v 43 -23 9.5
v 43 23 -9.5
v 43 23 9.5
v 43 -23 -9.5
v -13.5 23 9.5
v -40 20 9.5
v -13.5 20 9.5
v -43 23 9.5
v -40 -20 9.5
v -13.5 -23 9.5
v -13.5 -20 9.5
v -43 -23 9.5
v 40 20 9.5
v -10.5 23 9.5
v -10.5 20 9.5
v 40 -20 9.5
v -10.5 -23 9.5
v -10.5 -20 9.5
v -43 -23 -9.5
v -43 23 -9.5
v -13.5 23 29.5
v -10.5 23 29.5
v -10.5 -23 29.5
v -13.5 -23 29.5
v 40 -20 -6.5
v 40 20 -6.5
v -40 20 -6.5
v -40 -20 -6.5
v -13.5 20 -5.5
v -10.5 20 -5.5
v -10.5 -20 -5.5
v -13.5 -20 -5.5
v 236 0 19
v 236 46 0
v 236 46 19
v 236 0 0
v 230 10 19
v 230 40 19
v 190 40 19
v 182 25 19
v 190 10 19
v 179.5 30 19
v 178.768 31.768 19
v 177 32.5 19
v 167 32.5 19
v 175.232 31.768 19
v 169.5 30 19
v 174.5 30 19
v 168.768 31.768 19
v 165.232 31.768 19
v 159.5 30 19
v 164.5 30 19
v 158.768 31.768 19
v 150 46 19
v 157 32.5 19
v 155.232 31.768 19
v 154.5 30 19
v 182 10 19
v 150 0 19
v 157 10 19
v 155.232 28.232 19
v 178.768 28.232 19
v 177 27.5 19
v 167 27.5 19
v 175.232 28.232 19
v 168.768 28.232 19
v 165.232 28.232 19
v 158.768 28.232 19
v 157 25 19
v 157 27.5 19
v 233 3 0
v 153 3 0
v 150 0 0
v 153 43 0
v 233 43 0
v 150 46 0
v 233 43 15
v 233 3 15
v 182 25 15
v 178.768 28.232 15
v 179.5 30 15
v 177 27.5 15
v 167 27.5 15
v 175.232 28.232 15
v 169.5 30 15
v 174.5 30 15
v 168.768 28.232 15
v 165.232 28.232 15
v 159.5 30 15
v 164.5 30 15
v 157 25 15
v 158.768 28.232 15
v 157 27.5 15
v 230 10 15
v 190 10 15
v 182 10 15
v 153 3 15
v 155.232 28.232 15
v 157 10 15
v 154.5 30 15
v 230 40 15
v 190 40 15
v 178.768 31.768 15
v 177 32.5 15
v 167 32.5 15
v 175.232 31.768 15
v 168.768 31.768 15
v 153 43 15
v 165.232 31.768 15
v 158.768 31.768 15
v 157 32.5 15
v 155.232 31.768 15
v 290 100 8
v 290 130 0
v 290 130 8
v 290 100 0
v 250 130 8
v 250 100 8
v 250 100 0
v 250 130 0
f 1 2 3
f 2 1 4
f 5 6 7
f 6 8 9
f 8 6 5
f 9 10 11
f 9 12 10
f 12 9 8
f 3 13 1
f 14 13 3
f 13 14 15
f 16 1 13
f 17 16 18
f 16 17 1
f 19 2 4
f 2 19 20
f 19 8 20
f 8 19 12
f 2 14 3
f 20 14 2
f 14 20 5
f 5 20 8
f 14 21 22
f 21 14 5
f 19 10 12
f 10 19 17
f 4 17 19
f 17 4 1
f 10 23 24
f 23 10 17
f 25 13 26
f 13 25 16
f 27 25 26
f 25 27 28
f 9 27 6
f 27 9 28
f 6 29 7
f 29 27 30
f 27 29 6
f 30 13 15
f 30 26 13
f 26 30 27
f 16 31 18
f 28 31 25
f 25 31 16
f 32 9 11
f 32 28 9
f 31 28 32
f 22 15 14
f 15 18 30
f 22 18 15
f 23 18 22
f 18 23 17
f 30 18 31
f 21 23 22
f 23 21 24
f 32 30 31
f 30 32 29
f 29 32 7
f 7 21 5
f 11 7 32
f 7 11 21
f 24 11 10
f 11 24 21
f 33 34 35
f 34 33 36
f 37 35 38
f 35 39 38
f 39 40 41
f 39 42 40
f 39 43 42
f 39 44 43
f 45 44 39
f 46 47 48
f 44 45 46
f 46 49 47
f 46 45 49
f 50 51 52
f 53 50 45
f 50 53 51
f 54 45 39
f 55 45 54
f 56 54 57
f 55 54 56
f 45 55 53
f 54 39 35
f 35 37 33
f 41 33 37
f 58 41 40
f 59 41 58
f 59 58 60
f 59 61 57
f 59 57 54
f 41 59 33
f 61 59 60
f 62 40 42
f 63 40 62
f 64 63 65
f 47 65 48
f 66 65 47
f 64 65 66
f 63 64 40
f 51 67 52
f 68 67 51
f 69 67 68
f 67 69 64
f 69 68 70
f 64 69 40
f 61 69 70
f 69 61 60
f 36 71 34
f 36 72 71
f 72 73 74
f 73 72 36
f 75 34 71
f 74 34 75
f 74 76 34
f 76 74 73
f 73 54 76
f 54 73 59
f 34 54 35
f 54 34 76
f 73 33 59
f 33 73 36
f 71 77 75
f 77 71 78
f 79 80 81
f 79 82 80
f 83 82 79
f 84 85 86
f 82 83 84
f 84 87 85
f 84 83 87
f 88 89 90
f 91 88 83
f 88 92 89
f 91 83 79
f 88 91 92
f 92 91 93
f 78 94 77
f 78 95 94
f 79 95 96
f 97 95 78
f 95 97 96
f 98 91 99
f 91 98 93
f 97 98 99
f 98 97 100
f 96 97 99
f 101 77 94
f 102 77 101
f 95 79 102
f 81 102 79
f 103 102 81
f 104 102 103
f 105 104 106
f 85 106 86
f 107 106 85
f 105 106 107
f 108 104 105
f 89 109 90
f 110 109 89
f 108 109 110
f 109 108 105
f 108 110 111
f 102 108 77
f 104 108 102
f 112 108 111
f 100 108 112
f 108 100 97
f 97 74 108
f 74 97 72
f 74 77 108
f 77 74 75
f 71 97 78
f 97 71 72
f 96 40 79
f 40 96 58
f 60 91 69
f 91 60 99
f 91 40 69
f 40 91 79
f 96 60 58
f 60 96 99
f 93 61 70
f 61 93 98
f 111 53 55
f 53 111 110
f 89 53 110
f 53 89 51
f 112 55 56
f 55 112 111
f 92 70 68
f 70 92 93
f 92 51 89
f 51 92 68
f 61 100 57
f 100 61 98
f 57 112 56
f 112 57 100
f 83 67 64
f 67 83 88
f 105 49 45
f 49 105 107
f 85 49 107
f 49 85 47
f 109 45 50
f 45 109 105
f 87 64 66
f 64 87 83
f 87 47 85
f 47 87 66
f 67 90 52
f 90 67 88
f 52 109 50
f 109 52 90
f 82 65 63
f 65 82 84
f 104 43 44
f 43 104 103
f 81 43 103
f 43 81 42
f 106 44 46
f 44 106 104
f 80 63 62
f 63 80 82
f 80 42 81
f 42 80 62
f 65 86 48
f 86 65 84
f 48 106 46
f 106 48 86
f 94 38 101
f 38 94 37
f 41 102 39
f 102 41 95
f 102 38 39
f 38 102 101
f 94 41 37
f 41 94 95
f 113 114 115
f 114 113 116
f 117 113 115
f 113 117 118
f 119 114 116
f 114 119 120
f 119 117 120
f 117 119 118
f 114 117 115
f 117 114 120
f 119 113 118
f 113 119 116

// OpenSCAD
// Comment these
length = 86;//outer length of box
width= 46;//outer width of box

// outside box dimension
height = 19;//height of box
length2=30;
lengtho2=44;
width2=40;//inner width of box
lengthtwo=80;//inner length of box

// height of cutting tool
height2=18;

//height of lid
height20 = 19;
//divider between heating chamber and circuit
dividerFromTop = 55;
//height of cutting tool for lid
height22=16; 
lengthhole=25;//length of OLED hole
length2hole=40;//length of heating chamber door
widthhole=15;//width of OLED hole
width2hole= 30;//width of heating chamber door
heighthole=8;//depth of oled and chamber door holes
dhole=5;//diameters of button holes
depthhole=8;//depth of button hole

// Create basic shell width
shellWidth = 3;


module  createCaseBottom(width,length,height,shellWidth,dftp) {
    inner_box_width = width - (2*shellWidth);
    inner_box_length = length - (2*shellWidth);
    
    // inside
    difference() {             
                cube(size=[length, width, height],center=true); 
                translate([0,0,shellWidth])
                cube(size=[inner_box_length, inner_box_width, height], center=true); 
    } 
    translate([length/2 - dftp,0,12])
    cube(size=[shellWidth,width,height+height22], center=true);
        
}
module createCaseTop() {
difference(){
        difference() {
                    
                    translate([0, 0, 0]){
                        cube(size=[length, width, height20],center=false); 
                    }
                    translate([3,3,-1]) {
                        cube(size=[lengthtwo, width2, height22], center=false); 
                    }
            
        }
        translate([7,10,14]){
            cube(size=[lengthhole,widthhole,heighthole],center=false);
        }
         translate([7,30,15]){
            cylinder(depthhole,dhole/2,dhole/2,center=false);
        }
        translate([17,30,15]){
            cylinder(depthhole,dhole/2,dhole/2,center=false);
        }
        translate([27,30,15]){
            cylinder(depthhole,dhole/2,dhole/2,center=false);
        }
        translate([40,10,14]){
            cube(size=[length2hole,width2hole,heighthole],center=false);
        }   

}
}

translate([250,100,0]){
            cube(size=[length2hole,width2hole,heighthole],center=false);
        }
        
createCaseBottom(width,length,height,shellWidth,dividerFromTop);

translate([150,0,0])
createCaseTop();
